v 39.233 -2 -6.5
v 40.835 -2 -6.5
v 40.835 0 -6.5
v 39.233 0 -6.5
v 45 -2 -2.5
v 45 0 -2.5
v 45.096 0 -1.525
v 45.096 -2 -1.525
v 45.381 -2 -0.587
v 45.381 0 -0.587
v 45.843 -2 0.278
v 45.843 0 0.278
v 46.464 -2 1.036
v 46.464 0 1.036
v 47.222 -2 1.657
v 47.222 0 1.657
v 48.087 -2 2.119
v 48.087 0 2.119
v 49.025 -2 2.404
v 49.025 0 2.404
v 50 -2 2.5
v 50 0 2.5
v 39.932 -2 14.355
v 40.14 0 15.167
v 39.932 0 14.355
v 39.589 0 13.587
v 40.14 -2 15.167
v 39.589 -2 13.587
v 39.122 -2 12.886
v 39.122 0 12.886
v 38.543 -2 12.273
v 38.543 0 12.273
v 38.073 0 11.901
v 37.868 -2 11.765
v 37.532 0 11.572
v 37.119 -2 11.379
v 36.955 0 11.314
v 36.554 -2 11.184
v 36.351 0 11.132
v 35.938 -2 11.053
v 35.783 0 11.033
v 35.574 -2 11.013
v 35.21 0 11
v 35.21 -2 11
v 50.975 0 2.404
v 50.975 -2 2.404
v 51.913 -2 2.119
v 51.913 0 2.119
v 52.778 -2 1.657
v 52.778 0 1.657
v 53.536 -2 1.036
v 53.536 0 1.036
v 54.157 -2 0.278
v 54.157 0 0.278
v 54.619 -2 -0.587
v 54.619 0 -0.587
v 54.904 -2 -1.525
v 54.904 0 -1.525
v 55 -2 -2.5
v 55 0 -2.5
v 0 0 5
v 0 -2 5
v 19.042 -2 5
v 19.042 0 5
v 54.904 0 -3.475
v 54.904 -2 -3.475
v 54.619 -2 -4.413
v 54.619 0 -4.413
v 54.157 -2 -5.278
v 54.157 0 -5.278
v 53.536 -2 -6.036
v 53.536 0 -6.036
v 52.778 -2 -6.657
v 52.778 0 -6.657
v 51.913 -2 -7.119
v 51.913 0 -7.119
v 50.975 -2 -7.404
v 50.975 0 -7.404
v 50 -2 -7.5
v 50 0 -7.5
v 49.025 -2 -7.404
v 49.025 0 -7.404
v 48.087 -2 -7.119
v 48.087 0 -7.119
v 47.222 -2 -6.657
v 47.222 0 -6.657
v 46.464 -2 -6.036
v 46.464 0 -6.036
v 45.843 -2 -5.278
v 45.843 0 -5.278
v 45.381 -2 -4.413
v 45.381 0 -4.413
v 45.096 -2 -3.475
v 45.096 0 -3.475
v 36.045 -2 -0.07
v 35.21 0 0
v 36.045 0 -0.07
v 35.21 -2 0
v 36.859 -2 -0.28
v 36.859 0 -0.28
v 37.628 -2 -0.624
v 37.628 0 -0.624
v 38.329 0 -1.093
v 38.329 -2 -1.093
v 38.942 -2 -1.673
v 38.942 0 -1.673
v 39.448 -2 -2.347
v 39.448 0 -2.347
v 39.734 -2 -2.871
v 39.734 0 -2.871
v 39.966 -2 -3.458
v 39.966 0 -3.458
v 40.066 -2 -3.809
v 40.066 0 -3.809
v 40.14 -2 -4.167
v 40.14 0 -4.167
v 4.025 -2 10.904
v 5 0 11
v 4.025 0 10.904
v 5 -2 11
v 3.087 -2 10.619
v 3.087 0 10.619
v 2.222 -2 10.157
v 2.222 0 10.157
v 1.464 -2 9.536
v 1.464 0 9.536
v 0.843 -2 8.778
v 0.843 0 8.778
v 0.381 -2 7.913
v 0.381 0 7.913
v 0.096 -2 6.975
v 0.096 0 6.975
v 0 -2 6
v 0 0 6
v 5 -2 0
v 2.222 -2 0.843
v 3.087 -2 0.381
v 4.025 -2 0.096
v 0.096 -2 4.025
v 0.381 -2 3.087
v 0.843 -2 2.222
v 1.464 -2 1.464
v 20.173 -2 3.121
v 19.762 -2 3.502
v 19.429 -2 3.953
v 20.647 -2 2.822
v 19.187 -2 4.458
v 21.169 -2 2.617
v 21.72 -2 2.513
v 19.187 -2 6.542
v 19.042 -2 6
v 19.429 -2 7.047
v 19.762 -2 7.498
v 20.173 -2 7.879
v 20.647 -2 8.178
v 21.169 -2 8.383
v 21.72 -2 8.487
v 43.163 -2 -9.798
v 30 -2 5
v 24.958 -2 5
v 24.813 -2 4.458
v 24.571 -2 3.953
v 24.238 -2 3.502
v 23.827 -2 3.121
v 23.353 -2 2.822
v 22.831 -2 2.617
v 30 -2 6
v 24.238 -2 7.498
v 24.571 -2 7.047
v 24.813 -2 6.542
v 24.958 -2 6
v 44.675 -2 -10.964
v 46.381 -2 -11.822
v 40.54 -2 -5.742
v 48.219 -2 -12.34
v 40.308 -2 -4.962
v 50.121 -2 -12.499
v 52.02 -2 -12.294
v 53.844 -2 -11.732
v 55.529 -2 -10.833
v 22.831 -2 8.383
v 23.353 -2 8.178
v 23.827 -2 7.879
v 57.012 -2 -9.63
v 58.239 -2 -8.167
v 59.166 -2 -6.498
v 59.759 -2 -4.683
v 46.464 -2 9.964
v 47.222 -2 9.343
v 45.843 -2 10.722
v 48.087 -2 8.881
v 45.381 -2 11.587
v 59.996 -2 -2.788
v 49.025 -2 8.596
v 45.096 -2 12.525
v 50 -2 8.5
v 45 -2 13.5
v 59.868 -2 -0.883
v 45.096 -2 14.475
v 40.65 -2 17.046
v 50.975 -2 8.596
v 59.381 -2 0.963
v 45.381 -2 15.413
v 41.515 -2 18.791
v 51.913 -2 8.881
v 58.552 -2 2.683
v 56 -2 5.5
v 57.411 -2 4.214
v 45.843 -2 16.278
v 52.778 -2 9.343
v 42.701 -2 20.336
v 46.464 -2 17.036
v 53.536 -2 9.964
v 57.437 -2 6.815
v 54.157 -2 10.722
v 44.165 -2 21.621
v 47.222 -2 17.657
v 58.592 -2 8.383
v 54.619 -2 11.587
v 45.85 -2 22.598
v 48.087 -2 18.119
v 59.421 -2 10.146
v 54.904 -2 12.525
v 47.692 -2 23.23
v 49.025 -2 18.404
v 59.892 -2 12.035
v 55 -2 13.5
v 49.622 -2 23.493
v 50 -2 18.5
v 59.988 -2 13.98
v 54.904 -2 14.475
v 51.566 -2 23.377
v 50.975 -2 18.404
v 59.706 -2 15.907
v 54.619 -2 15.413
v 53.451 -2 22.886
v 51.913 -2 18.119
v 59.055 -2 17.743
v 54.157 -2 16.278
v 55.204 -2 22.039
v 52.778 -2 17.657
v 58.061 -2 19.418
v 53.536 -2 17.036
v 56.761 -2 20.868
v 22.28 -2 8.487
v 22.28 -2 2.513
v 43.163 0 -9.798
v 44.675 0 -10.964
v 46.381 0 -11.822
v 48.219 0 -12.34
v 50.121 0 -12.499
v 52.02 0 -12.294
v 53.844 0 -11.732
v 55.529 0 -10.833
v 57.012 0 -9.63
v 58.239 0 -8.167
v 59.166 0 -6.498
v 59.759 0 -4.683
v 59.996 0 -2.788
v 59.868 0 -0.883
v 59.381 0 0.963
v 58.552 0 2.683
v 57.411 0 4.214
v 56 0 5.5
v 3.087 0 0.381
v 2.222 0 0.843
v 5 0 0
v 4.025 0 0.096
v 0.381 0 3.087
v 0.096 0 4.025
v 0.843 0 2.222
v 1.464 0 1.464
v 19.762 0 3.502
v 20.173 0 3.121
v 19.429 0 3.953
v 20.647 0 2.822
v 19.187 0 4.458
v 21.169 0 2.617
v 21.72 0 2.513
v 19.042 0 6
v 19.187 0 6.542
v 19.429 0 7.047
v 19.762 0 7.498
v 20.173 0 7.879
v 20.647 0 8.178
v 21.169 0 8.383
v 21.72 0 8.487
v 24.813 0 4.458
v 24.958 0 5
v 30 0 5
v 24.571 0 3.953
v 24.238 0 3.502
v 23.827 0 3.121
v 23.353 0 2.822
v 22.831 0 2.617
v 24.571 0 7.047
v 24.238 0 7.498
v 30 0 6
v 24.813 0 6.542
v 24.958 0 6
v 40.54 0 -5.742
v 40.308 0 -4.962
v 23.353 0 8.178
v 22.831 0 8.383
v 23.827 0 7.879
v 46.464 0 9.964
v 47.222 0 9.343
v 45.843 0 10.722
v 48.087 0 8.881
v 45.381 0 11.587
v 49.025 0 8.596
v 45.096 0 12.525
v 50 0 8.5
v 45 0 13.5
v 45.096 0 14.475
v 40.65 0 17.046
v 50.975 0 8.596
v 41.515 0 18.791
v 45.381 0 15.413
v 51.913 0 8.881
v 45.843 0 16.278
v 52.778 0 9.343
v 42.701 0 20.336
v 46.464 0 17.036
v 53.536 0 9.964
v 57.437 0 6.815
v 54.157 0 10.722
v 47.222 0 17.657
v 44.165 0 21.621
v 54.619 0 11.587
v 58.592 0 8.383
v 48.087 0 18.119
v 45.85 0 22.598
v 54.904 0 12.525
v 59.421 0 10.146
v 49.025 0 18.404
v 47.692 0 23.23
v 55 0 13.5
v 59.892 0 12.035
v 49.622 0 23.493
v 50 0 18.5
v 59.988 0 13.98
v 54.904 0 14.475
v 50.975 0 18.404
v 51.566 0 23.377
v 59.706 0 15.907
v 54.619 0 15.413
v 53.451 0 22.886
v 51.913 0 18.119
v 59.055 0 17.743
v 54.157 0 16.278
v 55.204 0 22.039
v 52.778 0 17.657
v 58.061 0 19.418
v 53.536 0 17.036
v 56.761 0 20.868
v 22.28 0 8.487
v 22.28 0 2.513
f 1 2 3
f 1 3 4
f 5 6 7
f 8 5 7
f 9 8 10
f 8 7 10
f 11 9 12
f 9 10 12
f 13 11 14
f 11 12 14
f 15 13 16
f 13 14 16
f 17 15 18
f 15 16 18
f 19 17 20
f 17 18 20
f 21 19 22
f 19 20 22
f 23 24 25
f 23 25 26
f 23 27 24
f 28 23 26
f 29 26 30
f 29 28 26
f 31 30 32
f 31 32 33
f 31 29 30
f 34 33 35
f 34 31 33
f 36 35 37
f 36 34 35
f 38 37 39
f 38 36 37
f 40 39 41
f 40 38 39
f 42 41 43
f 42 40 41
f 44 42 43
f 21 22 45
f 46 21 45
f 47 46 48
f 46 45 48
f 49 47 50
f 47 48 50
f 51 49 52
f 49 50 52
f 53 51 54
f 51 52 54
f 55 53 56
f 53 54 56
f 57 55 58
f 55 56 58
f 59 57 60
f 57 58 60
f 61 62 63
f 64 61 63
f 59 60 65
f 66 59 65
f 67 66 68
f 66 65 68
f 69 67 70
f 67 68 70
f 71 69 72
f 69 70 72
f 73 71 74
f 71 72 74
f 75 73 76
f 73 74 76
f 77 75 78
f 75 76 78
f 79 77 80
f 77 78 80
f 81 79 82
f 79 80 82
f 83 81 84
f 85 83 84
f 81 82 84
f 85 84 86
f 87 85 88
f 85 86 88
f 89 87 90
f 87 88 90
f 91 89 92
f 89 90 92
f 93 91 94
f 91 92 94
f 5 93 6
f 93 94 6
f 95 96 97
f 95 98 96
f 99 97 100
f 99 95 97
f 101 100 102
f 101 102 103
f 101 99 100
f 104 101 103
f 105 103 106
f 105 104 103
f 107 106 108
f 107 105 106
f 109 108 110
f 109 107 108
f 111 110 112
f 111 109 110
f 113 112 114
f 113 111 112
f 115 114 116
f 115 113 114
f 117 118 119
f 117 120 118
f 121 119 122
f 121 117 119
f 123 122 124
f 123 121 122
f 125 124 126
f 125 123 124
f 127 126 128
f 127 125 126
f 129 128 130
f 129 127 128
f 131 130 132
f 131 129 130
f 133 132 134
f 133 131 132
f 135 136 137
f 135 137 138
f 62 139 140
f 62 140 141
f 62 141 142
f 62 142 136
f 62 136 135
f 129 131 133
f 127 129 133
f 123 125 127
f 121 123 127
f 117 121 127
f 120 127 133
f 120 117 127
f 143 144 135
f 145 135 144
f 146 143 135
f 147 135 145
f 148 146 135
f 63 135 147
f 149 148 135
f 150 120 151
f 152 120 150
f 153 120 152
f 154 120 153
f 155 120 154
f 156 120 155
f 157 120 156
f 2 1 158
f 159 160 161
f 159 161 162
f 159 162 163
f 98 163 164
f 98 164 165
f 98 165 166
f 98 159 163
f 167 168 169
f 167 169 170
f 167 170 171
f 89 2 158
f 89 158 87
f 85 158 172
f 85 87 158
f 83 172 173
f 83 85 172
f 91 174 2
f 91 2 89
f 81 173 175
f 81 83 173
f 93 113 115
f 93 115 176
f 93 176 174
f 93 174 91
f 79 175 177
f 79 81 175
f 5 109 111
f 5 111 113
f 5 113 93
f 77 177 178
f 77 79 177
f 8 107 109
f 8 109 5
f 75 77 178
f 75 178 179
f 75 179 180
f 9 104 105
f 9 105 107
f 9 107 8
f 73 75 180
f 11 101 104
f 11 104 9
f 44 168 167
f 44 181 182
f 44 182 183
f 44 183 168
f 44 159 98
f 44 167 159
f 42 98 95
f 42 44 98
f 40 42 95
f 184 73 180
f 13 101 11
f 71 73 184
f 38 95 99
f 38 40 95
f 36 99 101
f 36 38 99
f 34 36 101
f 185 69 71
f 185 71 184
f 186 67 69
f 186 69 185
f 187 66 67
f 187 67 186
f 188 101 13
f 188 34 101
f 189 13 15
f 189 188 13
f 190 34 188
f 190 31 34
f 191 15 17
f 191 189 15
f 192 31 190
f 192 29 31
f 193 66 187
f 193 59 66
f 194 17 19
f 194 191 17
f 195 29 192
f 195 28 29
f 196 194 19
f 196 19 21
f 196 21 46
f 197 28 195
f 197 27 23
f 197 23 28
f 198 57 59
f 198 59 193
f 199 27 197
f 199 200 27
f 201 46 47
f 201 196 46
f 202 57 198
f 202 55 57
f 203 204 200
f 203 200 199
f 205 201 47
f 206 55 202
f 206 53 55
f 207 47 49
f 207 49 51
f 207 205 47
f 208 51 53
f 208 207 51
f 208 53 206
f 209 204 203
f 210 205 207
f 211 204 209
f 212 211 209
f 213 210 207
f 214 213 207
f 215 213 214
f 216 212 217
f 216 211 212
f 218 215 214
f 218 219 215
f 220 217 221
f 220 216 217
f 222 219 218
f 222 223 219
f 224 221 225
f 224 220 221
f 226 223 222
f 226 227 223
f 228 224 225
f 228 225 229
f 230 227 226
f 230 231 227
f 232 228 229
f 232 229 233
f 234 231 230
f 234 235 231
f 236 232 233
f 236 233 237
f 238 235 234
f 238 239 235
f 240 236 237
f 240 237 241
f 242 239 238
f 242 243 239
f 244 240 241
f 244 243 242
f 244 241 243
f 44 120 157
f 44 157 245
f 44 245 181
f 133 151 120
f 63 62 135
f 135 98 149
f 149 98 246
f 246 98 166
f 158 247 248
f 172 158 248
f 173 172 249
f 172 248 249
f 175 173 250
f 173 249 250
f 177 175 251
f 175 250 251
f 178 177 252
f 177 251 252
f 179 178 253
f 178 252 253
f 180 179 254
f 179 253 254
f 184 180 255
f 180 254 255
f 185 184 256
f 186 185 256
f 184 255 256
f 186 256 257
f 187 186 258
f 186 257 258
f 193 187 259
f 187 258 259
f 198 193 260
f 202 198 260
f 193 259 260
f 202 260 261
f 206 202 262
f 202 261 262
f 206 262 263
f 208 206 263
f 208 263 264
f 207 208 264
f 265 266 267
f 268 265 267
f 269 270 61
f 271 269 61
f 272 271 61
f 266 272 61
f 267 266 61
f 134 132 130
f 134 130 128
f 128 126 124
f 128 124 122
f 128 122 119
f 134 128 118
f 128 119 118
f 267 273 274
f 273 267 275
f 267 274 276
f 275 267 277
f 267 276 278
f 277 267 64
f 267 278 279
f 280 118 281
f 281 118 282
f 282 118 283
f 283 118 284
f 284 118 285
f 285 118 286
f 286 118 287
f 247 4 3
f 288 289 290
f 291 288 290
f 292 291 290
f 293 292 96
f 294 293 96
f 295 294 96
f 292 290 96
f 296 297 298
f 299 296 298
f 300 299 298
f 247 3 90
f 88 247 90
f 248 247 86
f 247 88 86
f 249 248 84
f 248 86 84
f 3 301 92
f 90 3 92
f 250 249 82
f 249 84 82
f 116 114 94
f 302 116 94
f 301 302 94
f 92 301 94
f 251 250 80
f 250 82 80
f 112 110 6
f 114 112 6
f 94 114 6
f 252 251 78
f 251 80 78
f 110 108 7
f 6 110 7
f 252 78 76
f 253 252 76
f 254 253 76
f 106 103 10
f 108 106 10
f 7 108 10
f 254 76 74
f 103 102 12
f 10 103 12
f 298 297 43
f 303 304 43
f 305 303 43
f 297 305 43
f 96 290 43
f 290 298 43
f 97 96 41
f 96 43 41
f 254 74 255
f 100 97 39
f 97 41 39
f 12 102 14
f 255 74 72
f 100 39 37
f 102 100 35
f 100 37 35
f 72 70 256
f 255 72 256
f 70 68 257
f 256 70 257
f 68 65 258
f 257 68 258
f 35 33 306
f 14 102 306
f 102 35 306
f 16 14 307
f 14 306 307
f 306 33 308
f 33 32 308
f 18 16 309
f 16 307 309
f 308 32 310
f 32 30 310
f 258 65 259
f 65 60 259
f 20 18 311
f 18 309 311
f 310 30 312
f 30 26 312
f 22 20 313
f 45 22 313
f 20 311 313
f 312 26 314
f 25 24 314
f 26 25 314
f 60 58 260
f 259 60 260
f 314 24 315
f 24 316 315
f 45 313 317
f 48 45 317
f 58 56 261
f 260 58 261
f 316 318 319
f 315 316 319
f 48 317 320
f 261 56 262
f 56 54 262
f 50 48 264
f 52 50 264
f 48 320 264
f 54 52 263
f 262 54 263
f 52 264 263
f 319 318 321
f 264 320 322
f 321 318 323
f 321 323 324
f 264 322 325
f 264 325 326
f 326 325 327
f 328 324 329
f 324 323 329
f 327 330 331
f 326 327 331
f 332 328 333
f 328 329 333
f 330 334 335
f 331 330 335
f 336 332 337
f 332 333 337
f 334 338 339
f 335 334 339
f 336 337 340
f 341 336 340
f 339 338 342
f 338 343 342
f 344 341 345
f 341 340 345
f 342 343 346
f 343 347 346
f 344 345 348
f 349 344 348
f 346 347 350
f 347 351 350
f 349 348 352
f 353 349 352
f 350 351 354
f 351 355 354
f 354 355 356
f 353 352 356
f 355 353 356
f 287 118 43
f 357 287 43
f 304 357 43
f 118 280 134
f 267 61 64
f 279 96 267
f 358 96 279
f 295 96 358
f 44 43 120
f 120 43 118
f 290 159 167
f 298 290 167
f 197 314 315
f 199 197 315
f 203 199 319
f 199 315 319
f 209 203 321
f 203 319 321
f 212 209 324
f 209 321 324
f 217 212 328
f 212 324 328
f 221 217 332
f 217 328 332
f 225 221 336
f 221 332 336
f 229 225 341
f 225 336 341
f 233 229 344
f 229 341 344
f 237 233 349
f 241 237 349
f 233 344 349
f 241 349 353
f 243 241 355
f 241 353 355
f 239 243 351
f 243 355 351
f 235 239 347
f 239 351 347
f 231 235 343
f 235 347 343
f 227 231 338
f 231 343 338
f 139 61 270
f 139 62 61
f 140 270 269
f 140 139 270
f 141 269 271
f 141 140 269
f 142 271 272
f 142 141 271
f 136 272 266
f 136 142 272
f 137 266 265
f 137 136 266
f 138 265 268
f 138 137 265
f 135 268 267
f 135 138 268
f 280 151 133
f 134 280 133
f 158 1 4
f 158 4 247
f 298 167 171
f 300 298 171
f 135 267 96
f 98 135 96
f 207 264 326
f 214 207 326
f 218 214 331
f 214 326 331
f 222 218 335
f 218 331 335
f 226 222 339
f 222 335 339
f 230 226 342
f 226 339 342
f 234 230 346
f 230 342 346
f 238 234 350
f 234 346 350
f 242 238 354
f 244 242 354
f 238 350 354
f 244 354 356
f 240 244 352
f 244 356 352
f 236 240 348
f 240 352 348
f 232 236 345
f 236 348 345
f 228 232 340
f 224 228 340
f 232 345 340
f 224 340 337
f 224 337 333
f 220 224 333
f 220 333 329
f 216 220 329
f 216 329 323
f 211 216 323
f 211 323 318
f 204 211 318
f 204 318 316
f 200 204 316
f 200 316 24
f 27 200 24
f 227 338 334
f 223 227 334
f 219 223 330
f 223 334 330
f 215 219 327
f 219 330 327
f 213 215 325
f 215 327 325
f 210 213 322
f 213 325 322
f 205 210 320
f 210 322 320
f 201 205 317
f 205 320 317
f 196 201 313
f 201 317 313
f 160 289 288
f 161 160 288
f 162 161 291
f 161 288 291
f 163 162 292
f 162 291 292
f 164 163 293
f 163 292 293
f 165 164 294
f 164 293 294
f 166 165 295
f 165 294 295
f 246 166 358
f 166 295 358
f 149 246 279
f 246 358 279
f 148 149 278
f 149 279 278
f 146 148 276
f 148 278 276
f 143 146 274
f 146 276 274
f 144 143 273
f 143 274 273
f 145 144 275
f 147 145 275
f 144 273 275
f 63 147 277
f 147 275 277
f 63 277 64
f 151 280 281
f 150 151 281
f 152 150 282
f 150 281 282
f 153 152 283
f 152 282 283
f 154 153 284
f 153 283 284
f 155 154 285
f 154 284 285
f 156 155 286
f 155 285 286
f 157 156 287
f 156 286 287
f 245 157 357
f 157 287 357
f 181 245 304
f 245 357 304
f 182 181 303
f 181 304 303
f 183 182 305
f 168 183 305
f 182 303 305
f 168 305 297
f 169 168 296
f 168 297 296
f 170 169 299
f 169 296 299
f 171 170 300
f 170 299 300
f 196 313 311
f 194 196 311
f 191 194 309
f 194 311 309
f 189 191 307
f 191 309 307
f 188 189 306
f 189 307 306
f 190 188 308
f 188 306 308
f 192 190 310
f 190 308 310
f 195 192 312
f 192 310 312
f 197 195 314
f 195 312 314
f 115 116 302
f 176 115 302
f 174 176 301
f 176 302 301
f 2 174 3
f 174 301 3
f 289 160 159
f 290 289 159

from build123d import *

# Parameters (mm, degrees)
F1_DEPTH = 2
F2_R     = 5
F4_DEPTH = 2
F6_DEPTH = 2


# Not quite as in the source:
# - a feature names something its author has since deleted; it is built from what else it names


with BuildPart() as f1:
    # F0 (on Front) → F1 (new body)
    with BuildSketch(Plane.XZ):
        with BuildLine():
            Line((0, 5.5), (0, 0))
            Line((0, 0), (40, 0))
            Line((40, 0), (40, 5.5))
            Line((40, 5.5), (25, 5.5))
            ThreePointArc((25, 5.5), (22, 2.5), (19, 5.5))
            Line((19, 5.5), (0, 5.5))
        make_face()
        with BuildLine():
            Line((40, 5.5), (40, 0))
            Line((40, 0), (40, -2.5))
            ThreePointArc((40, -2.5), (41.05572809, 1.972135955), (44, 5.5))
            Line((44, 5.5), (40, 5.5))
        make_face()
        with BuildLine():
            Line((0, 11), (0, 5.5))
            Line((0, 5.5), (19, 5.5))
            ThreePointArc((19, 5.5), (22, 8.5), (25, 5.5))
            Line((25, 5.5), (40, 5.5))
            Line((40, 5.5), (40, 11))
            Line((40, 11), (0, 11))
        make_face()
        with BuildLine():
            Line((40, 11), (40, 5.5))
            Line((40, 5.5), (44, 5.5))
            ThreePointArc((44, 5.5), (41.05572809, 9.027864045), (40, 13.5))
            Line((40, 13.5), (40, 11))
        make_face()
        with BuildLine():
            Line((45, -2.5), (40, -2.5))
            ThreePointArc((40, -2.5), (50, -12.5), (60, -2.5))
            ThreePointArc((60, -2.5), (58.94427191, 1.972135955), (56, 5.5))
            ThreePointArc((56, 5.5), (53.1622776602, 4.0131670195), (50, 3.5))
            Line((50, 3.5), (50, 2.5))
            ThreePointArc((50, 2.5), (53.5355339059, 1.0355339059), (55, -2.5))
            ThreePointArc((55, -2.5), (50, -7.5), (45, -2.5))
        make_face()
        with BuildLine():
            ThreePointArc((44, 5.5), (41.05572809, 1.972135955), (40, -2.5))
            Line((40, -2.5), (45, -2.5))
            ThreePointArc((45, -2.5), (46.4644660941, 1.0355339059), (50, 2.5))
            Line((50, 2.5), (50, 3.5))
            ThreePointArc((50, 3.5), (46.8377223398, 4.0131670195), (44, 5.5))
        make_face()
        with BuildLine():
            ThreePointArc((40, 13.5), (41.05572809, 9.027864045), (44, 5.5))
            ThreePointArc((44, 5.5), (46.8377223398, 6.9868329805), (50, 7.5))
            Line((50, 7.5), (50, 8.5))
            ThreePointArc((50, 8.5), (46.4644660941, 9.9644660941), (45, 13.5))
            Line((45, 13.5), (40, 13.5))
        make_face()
        with BuildLine():
            Line((50, 5.5), (44, 5.5))
            ThreePointArc((44, 5.5), (46.8377223398, 4.0131670195), (50, 3.5))
            Line((50, 3.5), (50, 5.5))
        make_face()
        with BuildLine():
            ThreePointArc((50, 7.5), (46.8377223398, 6.9868329805), (44, 5.5))
            Line((44, 5.5), (50, 5.5))
            Line((50, 5.5), (50, 7.5))
        make_face()
        with BuildLine():
            ThreePointArc((60, 13.5), (50, 23.5), (40, 13.5))
            Line((40, 13.5), (45, 13.5))
            ThreePointArc((45, 13.5), (50, 18.5), (55, 13.5))
            ThreePointArc((55, 13.5), (53.5355339059, 9.9644660941), (50, 8.5))
            Line((50, 8.5), (50, 7.5))
            ThreePointArc((50, 7.5), (53.1622776602, 6.9868329805), (56, 5.5))
            ThreePointArc((56, 5.5), (58.94427191, 9.027864045), (60, 13.5))
        make_face()
        with BuildLine():
            ThreePointArc((56, 5.5), (53.1622776602, 6.9868329805), (50, 7.5))
            Line((50, 7.5), (50, 5.5))
            Line((50, 5.5), (56, 5.5))
        make_face()
        with BuildLine():
            Line((50, 5.5), (50, 3.5))
            ThreePointArc((50, 3.5), (53.1622776602, 4.0131670195), (56, 5.5))
            Line((56, 5.5), (50, 5.5))
        make_face()
    extrude(amount=F1_DEPTH)

    # F2
    f2_edges = [f1.edges().sort_by_distance(p)[0] for p in [
        (40, -1, 11),
        (40, -1, 0),
        (0, -1, 11),
        (0, -1, 0),
    ]]
    fillet(f2_edges, radius=F2_R)

    # F3 (on face) → F4 (cut, through all)
    with BuildSketch(Plane.XZ.offset(2)):
        with BuildLine():
            Line((19.0419601085, 6), (0, 6))
            Line((0, 6), (0, 5))
            Line((0, 5), (19.0419601085, 5))
            ThreePointArc((19.0419601085, 5), (19, 5.5), (19.0419601085, 6))
        make_face()
        with BuildLine():
            Line((30, 6), (24.9580398915, 6))
            ThreePointArc((24.9580398915, 6), (24.9894915684, 5.7508787808), (25, 5.5))
            ThreePointArc((25, 5.5), (24.9894915684, 5.2491212192), (24.9580398915, 5))
            Line((24.9580398915, 5), (30, 5))
            Line((30, 5), (30, 6))
        make_face()
    extrude(amount=-F4_DEPTH, mode=Mode.SUBTRACT)

    # F5 (on face) → F6 (join)
    with BuildSketch(Plane.XZ.offset(2)):
        with BuildLine():
            ThreePointArc((43.1634270419, -9.7980319394), (41.8309701191, -8.2677509312), (40.8348486101, -6.5))
            Line((40.8348486101, -6.5), (39.2329856296, -6.5))
            Line((39.2329856296, -6.5), (43.1634270419, -9.7980319394))
        make_face()
    extrude(amount=-F6_DEPTH)


solid = f1.part
